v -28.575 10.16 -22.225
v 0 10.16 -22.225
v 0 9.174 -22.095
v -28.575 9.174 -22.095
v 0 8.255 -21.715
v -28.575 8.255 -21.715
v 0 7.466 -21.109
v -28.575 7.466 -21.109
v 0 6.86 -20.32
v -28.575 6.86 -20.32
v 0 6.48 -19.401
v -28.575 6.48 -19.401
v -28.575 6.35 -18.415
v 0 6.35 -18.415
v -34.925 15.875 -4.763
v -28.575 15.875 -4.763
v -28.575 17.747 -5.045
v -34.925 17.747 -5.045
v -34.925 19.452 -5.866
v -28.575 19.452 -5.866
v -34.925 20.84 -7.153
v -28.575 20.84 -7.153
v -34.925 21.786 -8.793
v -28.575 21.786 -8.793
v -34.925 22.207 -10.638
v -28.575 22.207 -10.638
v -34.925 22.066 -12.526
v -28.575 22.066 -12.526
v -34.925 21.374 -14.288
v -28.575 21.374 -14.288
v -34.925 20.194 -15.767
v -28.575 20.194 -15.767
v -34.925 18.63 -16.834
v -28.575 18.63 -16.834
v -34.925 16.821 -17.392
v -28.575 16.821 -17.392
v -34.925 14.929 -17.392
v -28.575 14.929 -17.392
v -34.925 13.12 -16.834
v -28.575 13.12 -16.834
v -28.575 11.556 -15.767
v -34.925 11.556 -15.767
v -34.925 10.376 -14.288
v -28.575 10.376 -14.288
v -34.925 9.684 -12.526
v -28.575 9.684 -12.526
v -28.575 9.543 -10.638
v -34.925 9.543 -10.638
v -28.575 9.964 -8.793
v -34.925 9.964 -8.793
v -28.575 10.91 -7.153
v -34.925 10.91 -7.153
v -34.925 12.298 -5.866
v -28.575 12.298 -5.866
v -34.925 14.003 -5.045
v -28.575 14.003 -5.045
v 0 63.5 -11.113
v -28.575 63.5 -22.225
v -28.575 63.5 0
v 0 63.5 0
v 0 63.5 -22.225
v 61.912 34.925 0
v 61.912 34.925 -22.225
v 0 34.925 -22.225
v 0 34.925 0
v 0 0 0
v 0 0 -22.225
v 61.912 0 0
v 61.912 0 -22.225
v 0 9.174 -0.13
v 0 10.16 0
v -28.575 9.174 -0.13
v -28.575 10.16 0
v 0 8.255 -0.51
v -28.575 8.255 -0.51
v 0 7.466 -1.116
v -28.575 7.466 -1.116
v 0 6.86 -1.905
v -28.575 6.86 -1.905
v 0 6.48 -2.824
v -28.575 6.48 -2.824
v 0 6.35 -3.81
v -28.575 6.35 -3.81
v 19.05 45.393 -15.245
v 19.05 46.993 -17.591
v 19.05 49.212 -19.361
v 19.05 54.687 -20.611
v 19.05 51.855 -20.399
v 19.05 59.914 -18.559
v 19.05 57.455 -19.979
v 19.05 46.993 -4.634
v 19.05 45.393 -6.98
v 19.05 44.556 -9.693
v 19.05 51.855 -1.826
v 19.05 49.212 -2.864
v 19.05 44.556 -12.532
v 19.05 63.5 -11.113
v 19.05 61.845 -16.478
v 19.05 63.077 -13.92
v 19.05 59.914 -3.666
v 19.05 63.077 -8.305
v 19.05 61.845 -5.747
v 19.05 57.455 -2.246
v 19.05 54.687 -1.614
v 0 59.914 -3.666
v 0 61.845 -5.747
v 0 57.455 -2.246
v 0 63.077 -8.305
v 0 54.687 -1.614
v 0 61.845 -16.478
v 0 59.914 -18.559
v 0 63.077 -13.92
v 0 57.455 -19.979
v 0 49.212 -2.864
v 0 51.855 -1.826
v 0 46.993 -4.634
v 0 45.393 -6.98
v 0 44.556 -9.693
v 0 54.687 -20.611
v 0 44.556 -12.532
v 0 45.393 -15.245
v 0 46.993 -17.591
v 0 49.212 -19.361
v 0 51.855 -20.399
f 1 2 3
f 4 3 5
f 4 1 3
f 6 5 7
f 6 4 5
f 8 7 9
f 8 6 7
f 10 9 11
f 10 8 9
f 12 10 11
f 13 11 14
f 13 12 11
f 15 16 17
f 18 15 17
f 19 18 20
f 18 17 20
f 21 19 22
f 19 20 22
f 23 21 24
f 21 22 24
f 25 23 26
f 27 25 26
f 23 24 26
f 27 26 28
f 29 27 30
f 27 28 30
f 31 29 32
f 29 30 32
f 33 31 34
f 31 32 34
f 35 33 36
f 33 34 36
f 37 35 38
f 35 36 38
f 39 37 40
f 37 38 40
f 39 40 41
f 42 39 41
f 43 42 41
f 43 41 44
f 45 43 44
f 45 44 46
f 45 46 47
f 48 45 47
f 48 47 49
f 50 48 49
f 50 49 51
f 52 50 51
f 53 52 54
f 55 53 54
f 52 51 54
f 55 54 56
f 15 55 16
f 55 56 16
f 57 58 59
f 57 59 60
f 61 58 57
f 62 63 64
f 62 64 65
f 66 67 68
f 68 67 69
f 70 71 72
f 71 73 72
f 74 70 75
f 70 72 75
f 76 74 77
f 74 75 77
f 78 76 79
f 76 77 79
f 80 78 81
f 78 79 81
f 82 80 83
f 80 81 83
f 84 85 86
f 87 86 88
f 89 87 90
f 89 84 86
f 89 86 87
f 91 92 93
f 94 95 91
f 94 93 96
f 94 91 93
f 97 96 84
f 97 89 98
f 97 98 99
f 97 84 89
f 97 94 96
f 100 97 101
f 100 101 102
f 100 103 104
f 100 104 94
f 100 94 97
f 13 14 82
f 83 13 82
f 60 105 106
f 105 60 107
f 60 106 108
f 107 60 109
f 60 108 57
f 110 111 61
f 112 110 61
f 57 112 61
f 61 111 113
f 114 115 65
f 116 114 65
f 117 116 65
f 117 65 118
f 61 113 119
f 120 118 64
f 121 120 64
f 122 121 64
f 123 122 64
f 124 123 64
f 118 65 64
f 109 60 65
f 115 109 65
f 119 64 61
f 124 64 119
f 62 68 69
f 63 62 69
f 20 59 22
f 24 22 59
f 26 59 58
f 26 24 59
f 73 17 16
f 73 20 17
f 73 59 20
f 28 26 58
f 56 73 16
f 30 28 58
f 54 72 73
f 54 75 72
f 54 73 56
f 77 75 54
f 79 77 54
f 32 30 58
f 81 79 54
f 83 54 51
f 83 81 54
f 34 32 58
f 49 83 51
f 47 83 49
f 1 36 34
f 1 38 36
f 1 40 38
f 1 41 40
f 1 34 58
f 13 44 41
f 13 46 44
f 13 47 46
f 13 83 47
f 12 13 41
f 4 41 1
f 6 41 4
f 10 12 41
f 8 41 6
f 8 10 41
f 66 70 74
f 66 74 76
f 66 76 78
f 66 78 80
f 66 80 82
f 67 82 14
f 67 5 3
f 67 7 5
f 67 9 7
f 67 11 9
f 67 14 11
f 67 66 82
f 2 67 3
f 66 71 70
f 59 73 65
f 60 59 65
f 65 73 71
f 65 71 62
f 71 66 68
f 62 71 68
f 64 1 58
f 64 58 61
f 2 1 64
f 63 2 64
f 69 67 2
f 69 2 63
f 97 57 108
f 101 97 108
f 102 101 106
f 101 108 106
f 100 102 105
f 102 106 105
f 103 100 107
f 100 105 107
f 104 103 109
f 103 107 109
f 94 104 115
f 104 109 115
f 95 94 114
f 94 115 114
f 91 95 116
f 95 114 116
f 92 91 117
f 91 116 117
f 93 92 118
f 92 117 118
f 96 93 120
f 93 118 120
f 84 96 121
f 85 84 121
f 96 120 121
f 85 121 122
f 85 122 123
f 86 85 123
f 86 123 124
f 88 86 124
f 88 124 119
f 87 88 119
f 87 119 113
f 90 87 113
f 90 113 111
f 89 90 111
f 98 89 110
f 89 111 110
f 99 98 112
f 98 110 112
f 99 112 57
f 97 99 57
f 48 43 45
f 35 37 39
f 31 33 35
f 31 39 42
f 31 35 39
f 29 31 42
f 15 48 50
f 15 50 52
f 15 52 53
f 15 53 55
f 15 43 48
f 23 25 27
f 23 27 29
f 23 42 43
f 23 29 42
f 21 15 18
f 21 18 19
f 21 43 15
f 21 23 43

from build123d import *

# Parameters (mm, degrees)
SKETCH1_W           = 61.9125
SKETCH1_H           = 22.225
BOSS_EXTRUDE1_DEPTH = 34.925
SKETCH2_W           = 22.225
SKETCH2_H           = 28.575
BOSS_EXTRUDE2_DEPTH = 28.575
SKETCH3_W           = 28.575
SKETCH3_H           = 22.225
BOSS_EXTRUDE3_DEPTH = 28.575
SKETCH4_R           = 9.525
BOSS_EXTRUDE4_DEPTH = 19.05
SKETCH5_R           = 6.35
BOSS_EXTRUDE5_DEPTH = 6.35
FILLET1_R           = 3.81


with BuildPart() as part:
    # Sketch1 → Boss-Extrude1 (new body)
    with BuildSketch(Plane(origin=(0, 0, 0), x_dir=(1, 0, 0), z_dir=(0, 1, 0))):
        with Locations((30.95625, 11.1125)):
            Rectangle(SKETCH1_W, SKETCH1_H)
    extrude(amount=BOSS_EXTRUDE1_DEPTH)

    # Sketch2 → Boss-Extrude2 (add)
    with BuildSketch(Plane.ZY):
        with Locations((-11.1125, 20.6375)):
            Rectangle(SKETCH2_W, SKETCH2_H)
    extrude(amount=BOSS_EXTRUDE2_DEPTH)

    # Sketch3 → Boss-Extrude3 (add)
    with BuildSketch(Plane(origin=(0, 34.925, 0), x_dir=(1, 0, 0), z_dir=(0, 1, 0))):
        with Locations((-14.2875, 11.1125)):
            Rectangle(SKETCH3_W, SKETCH3_H)
    extrude(amount=BOSS_EXTRUDE3_DEPTH)

    # Sketch4 → Boss-Extrude4 (add)
    with BuildSketch(Plane(origin=(0, 0, 0), x_dir=(0, 0, -1), z_dir=(1, 0, 0))):
        with Locations(Location((11.1125, 53.975, 0), (0, 0, 90))):
            Circle(SKETCH4_R)
    extrude(amount=BOSS_EXTRUDE4_DEPTH)

    # Sketch5 → Boss-Extrude5 (add)
    with BuildSketch(Plane.ZY.offset(28.575)):
        with Locations((-11.1125, 15.875)):
            Circle(SKETCH5_R)
    extrude(amount=BOSS_EXTRUDE5_DEPTH)

    # Fillet1
    fillet1_edges = [part.edges().sort_by_distance(p)[0] for p in [
        (-14.2875, 6.35, -22.225),
        (-14.2875, 6.35, 0),
    ]]
    fillet(fillet1_edges, radius=FILLET1_R)


solid = part.part
